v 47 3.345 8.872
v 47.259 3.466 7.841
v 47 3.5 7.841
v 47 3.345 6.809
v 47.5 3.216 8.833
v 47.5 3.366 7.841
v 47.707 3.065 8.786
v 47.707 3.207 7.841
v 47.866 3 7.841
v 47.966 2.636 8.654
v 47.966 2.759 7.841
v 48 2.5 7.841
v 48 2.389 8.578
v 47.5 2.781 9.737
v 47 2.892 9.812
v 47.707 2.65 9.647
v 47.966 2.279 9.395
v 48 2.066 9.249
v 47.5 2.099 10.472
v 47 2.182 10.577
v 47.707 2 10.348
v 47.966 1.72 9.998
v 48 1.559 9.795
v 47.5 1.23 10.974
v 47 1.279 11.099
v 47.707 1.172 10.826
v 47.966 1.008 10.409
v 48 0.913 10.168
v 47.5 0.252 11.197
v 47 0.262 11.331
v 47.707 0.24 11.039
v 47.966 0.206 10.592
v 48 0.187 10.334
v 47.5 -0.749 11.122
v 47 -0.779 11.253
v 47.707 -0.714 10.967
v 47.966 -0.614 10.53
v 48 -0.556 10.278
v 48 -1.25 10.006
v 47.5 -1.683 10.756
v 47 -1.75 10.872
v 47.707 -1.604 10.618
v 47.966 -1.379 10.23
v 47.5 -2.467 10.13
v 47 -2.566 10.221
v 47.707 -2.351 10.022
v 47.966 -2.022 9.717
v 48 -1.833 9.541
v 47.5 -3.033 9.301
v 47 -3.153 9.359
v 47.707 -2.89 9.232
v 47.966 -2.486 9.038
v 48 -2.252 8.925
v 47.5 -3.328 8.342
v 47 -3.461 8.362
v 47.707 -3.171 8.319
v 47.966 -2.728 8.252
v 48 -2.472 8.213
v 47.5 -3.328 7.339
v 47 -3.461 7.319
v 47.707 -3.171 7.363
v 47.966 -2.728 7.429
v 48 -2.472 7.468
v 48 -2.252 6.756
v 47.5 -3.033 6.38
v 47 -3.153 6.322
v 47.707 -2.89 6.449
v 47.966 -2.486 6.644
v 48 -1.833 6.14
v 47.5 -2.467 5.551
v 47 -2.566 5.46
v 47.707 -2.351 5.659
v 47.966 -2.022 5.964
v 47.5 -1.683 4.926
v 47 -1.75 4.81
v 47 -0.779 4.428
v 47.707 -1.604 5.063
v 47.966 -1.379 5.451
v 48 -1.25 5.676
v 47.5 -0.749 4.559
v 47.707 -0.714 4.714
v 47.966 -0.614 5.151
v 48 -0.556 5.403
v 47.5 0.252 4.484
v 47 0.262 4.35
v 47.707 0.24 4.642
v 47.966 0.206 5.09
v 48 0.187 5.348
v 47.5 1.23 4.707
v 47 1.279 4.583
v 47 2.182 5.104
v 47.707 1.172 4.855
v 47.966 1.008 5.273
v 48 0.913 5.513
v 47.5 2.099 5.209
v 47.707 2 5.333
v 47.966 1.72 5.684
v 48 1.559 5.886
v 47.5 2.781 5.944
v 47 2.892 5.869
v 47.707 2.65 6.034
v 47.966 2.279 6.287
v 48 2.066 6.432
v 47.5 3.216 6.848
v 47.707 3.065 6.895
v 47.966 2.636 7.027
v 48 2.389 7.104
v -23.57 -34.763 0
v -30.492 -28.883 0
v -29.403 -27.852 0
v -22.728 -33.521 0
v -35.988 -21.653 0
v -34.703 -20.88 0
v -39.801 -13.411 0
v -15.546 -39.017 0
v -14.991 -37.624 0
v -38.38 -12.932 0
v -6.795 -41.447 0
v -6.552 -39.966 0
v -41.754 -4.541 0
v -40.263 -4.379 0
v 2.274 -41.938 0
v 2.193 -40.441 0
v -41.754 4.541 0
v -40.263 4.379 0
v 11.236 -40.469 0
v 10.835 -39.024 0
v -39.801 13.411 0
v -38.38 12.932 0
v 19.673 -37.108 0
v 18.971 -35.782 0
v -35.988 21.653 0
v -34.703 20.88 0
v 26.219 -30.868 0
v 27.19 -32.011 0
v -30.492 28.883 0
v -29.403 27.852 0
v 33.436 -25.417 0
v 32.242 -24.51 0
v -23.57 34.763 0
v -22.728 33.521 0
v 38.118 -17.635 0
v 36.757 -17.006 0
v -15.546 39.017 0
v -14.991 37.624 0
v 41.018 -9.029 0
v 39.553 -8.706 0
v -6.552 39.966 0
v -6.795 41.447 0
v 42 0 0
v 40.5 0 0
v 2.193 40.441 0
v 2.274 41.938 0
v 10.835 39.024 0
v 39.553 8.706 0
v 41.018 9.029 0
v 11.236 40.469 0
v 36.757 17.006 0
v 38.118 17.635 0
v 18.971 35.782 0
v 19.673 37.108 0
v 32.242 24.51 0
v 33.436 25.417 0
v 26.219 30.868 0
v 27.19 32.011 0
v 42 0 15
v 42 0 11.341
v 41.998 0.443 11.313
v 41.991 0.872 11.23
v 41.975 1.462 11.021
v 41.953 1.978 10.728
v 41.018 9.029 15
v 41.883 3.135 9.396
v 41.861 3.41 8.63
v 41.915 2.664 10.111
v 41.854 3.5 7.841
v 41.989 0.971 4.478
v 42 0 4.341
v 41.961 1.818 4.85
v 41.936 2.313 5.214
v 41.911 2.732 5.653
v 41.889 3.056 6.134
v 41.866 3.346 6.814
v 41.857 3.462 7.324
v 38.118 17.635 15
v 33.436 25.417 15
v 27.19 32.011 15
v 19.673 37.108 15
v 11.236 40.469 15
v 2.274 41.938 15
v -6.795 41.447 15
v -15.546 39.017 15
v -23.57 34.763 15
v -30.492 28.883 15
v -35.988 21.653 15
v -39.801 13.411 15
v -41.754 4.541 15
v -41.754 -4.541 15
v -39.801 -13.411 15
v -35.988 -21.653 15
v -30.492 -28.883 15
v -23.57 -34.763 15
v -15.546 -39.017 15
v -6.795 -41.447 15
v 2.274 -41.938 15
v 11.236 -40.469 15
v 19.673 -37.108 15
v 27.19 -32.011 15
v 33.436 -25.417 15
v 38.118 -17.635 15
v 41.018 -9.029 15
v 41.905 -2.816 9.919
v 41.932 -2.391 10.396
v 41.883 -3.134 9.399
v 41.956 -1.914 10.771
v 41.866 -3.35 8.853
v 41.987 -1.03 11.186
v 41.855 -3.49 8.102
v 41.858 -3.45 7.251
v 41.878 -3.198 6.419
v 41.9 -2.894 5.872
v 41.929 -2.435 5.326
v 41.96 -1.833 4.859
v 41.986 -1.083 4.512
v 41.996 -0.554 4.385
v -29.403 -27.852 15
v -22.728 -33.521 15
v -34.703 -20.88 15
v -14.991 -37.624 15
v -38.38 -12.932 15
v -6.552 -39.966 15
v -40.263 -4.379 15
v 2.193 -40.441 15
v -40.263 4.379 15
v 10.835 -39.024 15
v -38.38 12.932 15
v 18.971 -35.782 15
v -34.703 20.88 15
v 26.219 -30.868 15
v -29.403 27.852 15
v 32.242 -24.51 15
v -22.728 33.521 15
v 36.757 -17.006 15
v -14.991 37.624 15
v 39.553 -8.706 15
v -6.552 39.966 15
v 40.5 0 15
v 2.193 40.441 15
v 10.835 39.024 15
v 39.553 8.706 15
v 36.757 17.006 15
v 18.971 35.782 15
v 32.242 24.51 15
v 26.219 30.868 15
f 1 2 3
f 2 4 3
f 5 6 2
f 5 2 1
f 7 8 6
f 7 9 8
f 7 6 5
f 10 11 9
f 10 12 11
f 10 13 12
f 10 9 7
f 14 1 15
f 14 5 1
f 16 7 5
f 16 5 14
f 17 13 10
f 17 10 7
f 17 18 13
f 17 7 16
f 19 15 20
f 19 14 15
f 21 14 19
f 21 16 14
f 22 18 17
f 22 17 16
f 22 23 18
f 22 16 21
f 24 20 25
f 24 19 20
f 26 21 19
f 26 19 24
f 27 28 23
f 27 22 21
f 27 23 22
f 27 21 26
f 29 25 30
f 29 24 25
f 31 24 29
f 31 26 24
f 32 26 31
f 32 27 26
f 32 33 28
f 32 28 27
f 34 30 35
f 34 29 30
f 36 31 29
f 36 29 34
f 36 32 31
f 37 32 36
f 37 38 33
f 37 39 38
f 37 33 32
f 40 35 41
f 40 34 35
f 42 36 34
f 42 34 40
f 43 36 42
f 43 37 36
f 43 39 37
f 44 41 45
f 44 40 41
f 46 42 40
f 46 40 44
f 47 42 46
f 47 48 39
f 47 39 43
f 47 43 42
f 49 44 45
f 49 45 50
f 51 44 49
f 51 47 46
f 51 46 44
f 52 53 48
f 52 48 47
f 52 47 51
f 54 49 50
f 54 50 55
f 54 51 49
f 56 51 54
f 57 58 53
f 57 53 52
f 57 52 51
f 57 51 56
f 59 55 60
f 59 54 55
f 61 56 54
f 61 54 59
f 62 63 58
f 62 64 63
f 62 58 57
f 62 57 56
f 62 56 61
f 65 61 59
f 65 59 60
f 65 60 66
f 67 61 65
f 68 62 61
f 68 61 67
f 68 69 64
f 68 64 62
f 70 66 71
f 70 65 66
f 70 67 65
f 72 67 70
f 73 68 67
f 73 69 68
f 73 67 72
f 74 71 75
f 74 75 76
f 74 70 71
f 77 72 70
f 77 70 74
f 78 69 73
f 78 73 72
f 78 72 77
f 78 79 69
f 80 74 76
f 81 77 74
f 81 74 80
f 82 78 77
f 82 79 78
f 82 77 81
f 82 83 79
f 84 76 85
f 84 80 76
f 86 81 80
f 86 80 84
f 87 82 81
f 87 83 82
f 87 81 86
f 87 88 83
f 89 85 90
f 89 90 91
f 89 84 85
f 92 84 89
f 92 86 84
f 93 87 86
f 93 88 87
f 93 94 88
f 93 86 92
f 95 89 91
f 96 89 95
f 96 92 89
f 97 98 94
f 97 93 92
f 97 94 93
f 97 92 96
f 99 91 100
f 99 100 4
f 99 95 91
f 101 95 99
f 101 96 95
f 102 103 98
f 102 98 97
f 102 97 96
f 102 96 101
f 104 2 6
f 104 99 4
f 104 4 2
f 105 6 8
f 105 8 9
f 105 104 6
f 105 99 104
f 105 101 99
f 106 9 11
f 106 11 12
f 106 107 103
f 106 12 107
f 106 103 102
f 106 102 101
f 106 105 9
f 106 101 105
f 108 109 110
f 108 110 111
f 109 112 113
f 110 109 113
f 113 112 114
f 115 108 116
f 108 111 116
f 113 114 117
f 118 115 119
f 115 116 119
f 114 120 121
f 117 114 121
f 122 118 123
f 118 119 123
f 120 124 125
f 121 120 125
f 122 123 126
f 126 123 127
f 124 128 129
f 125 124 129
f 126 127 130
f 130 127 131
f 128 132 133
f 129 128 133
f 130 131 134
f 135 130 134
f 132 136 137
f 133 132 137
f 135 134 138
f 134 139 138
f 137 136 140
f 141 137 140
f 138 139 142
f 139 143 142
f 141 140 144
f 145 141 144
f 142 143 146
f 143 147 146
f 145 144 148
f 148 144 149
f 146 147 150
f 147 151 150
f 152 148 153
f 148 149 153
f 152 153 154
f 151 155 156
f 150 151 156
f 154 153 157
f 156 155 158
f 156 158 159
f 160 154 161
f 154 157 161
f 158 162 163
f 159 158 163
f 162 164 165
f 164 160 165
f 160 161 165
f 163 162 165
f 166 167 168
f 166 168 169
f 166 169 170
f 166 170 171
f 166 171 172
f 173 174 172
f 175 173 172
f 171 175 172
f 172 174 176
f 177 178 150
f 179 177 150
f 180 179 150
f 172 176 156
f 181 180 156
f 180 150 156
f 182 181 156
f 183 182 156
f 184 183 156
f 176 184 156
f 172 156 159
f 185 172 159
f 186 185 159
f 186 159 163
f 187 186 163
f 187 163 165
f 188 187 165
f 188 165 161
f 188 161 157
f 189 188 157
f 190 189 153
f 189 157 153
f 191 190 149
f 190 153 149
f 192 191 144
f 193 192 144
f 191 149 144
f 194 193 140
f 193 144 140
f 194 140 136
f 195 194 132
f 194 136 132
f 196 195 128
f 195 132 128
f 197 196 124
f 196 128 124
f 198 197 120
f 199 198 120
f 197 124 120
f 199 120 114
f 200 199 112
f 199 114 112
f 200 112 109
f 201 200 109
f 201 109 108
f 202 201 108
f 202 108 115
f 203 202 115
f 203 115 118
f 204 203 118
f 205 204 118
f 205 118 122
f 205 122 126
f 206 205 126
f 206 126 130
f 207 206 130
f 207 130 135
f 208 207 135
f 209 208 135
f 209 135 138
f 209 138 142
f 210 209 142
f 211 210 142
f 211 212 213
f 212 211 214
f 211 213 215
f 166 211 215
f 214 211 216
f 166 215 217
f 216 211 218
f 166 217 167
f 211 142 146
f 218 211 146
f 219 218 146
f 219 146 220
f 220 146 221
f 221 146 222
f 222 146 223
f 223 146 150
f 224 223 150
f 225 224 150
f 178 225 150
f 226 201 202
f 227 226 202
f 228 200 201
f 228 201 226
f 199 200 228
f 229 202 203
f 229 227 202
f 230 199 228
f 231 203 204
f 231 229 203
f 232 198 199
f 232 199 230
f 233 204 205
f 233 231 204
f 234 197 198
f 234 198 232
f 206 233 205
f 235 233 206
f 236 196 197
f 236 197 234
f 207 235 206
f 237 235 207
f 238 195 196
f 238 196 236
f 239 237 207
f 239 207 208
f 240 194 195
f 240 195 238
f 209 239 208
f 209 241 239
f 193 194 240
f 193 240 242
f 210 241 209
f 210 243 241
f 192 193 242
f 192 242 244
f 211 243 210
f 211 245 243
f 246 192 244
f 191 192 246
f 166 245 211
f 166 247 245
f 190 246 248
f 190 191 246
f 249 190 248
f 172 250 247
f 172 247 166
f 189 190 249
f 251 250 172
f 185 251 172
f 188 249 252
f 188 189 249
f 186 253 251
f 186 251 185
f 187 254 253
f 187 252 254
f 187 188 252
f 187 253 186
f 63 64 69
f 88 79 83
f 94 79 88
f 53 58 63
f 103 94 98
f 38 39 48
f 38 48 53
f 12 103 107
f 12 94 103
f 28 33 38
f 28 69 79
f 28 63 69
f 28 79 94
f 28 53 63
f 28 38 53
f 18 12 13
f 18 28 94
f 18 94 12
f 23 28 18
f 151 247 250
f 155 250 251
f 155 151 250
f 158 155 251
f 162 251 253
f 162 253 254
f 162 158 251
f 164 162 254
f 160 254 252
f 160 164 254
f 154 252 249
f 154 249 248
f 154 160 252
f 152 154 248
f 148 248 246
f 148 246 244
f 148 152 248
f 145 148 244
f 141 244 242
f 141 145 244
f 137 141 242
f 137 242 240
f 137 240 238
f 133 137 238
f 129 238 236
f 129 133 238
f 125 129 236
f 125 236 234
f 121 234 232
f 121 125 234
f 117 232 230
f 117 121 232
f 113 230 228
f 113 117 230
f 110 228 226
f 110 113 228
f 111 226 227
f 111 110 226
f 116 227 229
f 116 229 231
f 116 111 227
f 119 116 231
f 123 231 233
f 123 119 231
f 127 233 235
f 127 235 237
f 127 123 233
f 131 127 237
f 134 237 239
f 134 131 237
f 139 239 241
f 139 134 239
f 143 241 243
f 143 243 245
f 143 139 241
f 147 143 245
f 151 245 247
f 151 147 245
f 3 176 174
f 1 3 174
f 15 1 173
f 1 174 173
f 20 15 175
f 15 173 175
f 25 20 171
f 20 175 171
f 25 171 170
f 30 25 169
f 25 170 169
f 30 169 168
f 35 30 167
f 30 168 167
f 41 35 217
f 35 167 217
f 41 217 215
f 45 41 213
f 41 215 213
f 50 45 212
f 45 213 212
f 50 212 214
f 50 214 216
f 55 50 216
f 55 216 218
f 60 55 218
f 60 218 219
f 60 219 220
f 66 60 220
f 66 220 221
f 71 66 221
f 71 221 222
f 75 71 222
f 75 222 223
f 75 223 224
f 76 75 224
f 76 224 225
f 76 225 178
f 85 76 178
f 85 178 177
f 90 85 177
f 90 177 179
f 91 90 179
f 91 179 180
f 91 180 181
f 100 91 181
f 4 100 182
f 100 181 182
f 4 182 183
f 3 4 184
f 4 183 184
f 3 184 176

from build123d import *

# Parameters (mm, degrees)
F0_R     = 42
F0_R_2   = 40.5
F1_DEPTH = 15
F3_R     = 3.5
F4_DEPTH = 7
F5_R     = 1


with BuildPart() as f1:
    # F0 (on Top) → F1 (new body)
    with BuildSketch(Plane.XY):
        Circle(F0_R)
        Circle(F0_R_2, mode=Mode.SUBTRACT)
    extrude(amount=F1_DEPTH)

    # F3 (on offset) → F4 (join)
    with BuildSketch(Plane.YZ.offset(41)):
        with Locations((0, 7.840633)):
            Circle(F3_R)
    extrude(amount=F4_DEPTH)

    # F5
    f5_edges = [f1.edges().sort_by_distance(p)[0] for p in [
        (48, -3.5, 7.840633),
    ]]
    fillet(f5_edges, radius=F5_R)


solid = f1.part
